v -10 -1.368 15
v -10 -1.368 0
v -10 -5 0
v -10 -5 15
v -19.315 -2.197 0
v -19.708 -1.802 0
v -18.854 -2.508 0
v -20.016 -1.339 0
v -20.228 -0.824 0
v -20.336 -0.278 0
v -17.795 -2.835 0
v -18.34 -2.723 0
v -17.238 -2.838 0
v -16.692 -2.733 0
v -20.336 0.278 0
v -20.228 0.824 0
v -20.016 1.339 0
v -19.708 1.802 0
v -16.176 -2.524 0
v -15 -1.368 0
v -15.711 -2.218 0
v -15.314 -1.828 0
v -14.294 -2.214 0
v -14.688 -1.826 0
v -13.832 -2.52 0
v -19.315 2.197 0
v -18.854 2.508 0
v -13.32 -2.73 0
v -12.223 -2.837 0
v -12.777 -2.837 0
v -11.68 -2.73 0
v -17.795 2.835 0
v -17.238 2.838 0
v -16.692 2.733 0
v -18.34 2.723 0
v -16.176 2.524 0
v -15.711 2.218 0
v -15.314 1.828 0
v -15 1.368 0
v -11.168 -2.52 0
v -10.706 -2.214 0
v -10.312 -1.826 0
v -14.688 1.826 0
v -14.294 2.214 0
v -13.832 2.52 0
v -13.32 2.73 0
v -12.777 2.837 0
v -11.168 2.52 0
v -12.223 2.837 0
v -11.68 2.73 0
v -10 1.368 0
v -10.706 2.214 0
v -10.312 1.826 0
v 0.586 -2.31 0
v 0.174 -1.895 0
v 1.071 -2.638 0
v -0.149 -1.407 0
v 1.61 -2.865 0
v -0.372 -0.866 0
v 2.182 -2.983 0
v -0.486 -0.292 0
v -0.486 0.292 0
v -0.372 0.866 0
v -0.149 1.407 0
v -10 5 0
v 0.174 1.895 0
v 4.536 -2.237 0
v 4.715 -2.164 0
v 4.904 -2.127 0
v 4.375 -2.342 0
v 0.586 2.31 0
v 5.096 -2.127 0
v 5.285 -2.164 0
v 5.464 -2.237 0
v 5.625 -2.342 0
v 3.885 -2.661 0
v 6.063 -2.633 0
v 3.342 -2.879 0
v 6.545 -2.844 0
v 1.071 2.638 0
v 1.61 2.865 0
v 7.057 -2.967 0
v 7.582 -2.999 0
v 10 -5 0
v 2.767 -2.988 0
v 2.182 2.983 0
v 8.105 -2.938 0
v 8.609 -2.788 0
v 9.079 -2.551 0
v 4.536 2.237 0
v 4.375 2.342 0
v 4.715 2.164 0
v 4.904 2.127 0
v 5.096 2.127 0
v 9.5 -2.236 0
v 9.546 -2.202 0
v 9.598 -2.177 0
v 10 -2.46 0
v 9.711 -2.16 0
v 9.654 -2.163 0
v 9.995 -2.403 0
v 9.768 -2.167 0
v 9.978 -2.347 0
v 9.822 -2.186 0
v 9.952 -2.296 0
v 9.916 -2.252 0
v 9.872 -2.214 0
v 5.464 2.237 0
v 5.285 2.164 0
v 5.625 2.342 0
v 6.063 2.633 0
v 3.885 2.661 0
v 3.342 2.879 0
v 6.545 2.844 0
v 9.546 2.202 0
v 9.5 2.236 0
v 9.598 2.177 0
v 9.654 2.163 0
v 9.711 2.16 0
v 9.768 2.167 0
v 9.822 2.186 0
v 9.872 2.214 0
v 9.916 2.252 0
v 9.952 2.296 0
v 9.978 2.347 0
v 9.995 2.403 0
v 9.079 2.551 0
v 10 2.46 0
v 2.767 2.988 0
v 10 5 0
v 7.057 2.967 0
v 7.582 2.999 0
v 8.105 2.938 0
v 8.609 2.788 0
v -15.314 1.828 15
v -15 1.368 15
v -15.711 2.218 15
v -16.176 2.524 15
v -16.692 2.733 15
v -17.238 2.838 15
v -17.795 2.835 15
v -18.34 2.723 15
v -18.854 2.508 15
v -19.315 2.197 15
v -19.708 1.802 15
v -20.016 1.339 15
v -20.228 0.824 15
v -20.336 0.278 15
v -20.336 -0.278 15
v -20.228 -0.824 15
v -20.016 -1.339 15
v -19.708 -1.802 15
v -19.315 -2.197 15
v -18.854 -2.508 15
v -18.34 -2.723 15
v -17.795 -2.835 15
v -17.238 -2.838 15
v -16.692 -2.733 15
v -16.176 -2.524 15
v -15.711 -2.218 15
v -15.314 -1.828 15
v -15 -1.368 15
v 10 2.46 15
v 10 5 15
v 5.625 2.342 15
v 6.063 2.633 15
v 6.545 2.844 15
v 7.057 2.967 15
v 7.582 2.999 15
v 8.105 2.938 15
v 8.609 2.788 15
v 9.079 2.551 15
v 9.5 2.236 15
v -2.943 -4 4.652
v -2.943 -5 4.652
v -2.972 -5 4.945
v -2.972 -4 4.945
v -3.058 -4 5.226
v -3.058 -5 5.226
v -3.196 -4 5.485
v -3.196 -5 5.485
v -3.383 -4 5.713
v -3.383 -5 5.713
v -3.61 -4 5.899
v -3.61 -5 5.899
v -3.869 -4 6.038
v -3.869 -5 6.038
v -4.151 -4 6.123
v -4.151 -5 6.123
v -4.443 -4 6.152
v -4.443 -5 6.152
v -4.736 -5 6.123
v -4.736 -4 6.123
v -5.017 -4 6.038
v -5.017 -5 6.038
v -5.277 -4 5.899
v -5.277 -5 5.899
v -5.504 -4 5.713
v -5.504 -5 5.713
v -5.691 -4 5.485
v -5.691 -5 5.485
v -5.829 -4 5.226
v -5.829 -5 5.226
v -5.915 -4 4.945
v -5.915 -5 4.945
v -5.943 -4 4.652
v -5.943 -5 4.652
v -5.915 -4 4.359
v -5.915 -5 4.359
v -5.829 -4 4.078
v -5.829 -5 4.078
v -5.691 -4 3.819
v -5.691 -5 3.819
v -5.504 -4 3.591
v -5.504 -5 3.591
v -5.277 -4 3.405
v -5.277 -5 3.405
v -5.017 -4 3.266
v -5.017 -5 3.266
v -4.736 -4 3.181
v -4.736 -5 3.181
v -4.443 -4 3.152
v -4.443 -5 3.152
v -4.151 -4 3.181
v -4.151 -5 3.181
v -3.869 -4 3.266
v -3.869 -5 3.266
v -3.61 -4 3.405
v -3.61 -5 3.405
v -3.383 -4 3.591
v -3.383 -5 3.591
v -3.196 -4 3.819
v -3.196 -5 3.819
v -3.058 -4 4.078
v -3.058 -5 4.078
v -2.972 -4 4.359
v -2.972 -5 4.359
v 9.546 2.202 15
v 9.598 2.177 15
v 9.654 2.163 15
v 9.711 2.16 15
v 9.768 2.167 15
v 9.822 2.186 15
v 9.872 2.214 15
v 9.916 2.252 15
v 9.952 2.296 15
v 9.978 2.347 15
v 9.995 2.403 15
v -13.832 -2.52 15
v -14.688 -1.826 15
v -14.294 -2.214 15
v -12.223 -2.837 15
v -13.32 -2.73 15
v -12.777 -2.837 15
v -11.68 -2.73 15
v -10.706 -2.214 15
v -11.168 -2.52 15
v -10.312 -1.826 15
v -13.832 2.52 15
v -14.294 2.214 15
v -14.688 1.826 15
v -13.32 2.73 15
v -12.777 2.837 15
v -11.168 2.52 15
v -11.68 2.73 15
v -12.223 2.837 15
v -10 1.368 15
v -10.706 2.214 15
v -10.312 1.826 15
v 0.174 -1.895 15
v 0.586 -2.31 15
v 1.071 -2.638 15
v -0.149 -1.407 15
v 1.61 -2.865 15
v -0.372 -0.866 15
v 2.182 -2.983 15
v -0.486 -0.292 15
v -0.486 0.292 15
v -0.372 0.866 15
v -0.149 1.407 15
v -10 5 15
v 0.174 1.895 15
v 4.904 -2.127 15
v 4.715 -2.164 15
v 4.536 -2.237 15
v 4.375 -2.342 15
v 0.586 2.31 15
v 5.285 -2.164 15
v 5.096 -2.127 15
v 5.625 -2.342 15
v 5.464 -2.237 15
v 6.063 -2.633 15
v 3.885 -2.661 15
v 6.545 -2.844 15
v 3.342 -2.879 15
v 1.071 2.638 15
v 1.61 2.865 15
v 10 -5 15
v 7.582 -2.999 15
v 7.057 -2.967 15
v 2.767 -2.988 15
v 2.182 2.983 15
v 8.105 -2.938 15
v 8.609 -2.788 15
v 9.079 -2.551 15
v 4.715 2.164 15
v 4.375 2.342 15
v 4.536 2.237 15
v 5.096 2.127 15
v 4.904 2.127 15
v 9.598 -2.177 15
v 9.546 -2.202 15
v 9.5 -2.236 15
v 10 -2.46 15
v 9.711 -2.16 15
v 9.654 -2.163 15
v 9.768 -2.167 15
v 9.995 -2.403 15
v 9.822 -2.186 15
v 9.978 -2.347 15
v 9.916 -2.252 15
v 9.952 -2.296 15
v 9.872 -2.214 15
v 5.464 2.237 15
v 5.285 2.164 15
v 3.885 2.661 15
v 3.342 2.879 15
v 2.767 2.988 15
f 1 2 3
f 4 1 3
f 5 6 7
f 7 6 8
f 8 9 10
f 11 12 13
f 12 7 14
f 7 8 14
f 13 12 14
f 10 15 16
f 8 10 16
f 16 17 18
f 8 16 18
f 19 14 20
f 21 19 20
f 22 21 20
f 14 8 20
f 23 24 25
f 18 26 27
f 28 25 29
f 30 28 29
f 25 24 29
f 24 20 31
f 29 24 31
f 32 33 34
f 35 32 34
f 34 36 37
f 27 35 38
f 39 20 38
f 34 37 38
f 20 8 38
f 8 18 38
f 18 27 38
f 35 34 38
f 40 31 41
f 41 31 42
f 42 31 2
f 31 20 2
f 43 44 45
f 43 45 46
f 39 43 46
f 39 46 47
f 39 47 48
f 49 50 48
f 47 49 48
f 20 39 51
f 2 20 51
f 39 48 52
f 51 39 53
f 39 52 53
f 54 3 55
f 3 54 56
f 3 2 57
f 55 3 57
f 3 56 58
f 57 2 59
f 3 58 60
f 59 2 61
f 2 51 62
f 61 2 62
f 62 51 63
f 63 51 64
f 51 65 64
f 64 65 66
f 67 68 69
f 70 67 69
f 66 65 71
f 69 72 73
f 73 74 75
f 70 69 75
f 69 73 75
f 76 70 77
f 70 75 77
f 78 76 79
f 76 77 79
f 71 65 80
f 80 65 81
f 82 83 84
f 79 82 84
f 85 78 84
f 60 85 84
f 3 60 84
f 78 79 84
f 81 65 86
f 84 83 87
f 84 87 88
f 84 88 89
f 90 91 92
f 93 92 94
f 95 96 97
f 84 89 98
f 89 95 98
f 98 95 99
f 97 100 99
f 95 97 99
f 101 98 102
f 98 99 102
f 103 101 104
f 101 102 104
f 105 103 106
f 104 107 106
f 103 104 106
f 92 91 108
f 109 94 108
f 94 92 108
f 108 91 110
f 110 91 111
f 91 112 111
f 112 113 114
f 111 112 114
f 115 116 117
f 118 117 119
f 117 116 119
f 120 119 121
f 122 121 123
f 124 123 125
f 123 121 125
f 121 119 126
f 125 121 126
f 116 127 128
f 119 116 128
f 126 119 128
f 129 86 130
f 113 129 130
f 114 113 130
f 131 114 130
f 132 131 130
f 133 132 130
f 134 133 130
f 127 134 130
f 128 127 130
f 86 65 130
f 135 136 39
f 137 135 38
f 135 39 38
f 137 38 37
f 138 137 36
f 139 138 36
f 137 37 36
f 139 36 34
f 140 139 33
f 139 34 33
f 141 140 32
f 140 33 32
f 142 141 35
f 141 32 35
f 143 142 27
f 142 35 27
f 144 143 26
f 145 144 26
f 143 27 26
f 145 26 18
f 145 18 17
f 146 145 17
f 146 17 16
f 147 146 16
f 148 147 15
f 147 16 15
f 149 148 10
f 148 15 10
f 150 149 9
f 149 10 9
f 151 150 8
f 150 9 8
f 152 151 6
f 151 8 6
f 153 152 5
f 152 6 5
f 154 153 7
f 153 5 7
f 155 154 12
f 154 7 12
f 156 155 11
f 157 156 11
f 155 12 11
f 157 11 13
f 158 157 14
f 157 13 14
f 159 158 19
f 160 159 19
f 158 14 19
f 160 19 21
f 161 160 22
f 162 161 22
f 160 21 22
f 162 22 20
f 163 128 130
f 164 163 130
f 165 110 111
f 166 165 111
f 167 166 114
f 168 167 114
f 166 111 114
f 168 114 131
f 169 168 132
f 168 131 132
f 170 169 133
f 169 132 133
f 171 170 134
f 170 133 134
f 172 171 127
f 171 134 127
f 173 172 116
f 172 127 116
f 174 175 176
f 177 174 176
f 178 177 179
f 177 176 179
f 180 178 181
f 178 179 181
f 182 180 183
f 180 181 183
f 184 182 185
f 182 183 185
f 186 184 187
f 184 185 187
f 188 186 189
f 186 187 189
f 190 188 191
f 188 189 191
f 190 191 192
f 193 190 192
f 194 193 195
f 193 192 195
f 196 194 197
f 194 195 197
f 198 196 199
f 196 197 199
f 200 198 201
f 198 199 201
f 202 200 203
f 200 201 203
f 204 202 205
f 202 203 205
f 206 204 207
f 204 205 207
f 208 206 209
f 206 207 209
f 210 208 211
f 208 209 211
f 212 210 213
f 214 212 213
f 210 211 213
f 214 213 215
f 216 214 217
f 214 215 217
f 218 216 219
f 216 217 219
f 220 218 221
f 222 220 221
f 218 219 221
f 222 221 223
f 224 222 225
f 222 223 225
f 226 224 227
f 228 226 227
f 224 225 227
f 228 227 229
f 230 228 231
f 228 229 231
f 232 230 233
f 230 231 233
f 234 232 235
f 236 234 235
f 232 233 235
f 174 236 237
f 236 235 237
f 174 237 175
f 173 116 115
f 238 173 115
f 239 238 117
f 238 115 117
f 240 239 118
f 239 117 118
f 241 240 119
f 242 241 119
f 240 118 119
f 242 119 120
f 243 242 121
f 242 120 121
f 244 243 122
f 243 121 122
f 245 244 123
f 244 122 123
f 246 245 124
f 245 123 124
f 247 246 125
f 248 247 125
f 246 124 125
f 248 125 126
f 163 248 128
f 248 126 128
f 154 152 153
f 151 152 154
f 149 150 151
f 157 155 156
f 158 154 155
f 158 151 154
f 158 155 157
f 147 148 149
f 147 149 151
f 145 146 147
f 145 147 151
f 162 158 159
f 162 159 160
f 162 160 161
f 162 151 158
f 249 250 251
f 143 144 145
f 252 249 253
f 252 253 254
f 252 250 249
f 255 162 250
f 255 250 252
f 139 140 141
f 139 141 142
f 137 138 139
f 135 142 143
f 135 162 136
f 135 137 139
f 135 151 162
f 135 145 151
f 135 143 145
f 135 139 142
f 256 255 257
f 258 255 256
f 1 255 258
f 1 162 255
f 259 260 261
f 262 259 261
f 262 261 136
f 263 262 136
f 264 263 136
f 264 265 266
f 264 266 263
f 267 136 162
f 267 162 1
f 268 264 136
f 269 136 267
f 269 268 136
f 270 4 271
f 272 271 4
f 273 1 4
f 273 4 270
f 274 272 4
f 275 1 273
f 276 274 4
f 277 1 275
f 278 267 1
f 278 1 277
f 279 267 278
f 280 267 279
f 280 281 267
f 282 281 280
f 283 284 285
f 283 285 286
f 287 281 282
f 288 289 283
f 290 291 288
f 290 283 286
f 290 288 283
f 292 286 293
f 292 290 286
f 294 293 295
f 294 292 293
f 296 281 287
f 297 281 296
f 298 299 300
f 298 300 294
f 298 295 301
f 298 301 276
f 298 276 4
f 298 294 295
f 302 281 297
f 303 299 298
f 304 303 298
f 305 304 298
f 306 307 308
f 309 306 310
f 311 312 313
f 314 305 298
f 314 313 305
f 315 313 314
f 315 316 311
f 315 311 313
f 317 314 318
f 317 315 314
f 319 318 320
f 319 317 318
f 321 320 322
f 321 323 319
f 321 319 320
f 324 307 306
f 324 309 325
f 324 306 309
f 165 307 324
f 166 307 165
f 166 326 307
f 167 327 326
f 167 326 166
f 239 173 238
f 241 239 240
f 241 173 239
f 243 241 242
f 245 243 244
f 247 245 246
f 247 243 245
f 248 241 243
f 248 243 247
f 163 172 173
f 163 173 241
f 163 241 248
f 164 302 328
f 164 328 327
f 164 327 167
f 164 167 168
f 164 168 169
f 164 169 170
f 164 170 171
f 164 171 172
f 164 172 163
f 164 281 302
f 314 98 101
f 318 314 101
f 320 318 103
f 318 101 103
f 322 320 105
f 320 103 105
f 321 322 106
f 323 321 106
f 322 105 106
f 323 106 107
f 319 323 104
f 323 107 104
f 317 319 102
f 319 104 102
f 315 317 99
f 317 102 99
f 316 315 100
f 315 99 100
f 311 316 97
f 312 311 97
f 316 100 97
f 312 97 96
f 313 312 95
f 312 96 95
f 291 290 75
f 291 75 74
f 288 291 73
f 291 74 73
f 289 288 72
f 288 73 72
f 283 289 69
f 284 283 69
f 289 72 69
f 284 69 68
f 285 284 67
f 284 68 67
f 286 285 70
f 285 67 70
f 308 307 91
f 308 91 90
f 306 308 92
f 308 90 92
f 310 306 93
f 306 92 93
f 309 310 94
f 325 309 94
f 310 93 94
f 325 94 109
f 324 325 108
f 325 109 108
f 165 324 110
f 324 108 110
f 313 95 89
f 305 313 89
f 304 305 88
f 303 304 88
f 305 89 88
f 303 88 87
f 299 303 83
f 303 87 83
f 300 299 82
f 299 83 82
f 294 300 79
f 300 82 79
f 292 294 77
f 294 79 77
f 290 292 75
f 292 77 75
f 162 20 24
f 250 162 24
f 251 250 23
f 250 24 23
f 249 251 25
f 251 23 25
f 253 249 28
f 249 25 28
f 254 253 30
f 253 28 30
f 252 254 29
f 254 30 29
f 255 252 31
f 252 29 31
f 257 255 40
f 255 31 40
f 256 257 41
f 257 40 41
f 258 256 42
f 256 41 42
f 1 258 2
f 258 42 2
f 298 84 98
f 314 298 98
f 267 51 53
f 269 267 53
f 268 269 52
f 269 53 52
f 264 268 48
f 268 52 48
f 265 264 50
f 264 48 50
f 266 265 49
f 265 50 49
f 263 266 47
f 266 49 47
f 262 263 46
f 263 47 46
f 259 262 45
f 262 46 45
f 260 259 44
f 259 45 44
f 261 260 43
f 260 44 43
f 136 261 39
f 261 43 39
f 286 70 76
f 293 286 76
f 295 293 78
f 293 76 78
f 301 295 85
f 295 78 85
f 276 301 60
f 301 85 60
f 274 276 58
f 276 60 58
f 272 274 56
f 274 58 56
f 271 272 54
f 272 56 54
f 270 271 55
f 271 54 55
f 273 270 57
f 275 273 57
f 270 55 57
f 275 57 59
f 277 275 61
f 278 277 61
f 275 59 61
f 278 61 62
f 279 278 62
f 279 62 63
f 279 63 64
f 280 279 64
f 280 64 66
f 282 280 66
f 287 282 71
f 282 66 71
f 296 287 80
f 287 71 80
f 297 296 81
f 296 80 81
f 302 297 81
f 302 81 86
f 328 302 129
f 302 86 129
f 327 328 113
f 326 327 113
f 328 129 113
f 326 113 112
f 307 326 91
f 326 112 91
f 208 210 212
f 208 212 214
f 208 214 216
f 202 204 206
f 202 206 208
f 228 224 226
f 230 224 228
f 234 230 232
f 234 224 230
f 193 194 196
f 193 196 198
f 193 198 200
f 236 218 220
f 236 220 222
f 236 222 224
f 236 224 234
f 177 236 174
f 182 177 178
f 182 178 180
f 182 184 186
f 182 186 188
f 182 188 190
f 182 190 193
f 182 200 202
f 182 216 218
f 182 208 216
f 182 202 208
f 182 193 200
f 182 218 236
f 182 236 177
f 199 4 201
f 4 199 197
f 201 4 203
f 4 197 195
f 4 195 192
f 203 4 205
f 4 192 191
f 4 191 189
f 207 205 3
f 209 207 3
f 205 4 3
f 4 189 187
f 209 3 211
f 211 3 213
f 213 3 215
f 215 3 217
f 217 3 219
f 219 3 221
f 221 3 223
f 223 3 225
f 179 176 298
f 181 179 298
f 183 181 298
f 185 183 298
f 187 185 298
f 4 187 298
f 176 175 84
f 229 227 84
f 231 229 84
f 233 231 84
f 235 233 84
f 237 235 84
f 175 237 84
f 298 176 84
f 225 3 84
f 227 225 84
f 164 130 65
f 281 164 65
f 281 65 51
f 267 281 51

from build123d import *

# Parameters (mm, degrees)
F1_DEPTH = 15
F2_R     = 1.5
F3_DEPTH = 1


with BuildPart() as f1:
    # F0 (on Top) → F1 (new body)
    with BuildSketch(Plane.XY):
        with BuildLine():
            Line((-10, -5), (10, -5))
            Line((10, -5), (10, -2.459675))
            ThreePointArc((10, -2.459675), (9.822474, -2.185813), (9.5, -2.236068))
            ThreePointArc((9.5, -2.236068), (7.581884, -2.998882), (5.625, -2.341874))
            ThreePointArc((5.625, -2.341874), (5, -2.122499), (4.375, -2.341874))
            ThreePointArc((4.375, -2.341874), (-0.5, 0), (4.375, 2.341874))
            ThreePointArc((4.375, 2.341874), (5, 2.122499), (5.625, 2.341874))
            ThreePointArc((5.625, 2.341874), (7.581884, 2.998882), (9.5, 2.236068))
            ThreePointArc((9.5, 2.236068), (9.822474, 2.185813), (10, 2.459675))
            Line((10, 2.459675), (10, 5))
            Line((10, 5), (-10, 5))
            Line((-10, 5), (-10, 1.368393))
            ThreePointArc((-10, 1.368393), (-12.5, 2.85), (-15, 1.368393))
            ThreePointArc((-15, 1.368393), (-20.35, 0), (-15, -1.368393))
            ThreePointArc((-15, -1.368393), (-12.5, -2.85), (-10, -1.368393))
            Line((-10, -1.368393), (-10, -5))
        make_face()
    extrude(amount=F1_DEPTH)

    # F2 (on face) → F3 (cut)
    with BuildSketch(Plane.XZ.offset(5)):
        with Locations((-4.443438, 4.652022)):
            Circle(F2_R)
    extrude(amount=-F3_DEPTH, mode=Mode.SUBTRACT)


solid = f1.part
